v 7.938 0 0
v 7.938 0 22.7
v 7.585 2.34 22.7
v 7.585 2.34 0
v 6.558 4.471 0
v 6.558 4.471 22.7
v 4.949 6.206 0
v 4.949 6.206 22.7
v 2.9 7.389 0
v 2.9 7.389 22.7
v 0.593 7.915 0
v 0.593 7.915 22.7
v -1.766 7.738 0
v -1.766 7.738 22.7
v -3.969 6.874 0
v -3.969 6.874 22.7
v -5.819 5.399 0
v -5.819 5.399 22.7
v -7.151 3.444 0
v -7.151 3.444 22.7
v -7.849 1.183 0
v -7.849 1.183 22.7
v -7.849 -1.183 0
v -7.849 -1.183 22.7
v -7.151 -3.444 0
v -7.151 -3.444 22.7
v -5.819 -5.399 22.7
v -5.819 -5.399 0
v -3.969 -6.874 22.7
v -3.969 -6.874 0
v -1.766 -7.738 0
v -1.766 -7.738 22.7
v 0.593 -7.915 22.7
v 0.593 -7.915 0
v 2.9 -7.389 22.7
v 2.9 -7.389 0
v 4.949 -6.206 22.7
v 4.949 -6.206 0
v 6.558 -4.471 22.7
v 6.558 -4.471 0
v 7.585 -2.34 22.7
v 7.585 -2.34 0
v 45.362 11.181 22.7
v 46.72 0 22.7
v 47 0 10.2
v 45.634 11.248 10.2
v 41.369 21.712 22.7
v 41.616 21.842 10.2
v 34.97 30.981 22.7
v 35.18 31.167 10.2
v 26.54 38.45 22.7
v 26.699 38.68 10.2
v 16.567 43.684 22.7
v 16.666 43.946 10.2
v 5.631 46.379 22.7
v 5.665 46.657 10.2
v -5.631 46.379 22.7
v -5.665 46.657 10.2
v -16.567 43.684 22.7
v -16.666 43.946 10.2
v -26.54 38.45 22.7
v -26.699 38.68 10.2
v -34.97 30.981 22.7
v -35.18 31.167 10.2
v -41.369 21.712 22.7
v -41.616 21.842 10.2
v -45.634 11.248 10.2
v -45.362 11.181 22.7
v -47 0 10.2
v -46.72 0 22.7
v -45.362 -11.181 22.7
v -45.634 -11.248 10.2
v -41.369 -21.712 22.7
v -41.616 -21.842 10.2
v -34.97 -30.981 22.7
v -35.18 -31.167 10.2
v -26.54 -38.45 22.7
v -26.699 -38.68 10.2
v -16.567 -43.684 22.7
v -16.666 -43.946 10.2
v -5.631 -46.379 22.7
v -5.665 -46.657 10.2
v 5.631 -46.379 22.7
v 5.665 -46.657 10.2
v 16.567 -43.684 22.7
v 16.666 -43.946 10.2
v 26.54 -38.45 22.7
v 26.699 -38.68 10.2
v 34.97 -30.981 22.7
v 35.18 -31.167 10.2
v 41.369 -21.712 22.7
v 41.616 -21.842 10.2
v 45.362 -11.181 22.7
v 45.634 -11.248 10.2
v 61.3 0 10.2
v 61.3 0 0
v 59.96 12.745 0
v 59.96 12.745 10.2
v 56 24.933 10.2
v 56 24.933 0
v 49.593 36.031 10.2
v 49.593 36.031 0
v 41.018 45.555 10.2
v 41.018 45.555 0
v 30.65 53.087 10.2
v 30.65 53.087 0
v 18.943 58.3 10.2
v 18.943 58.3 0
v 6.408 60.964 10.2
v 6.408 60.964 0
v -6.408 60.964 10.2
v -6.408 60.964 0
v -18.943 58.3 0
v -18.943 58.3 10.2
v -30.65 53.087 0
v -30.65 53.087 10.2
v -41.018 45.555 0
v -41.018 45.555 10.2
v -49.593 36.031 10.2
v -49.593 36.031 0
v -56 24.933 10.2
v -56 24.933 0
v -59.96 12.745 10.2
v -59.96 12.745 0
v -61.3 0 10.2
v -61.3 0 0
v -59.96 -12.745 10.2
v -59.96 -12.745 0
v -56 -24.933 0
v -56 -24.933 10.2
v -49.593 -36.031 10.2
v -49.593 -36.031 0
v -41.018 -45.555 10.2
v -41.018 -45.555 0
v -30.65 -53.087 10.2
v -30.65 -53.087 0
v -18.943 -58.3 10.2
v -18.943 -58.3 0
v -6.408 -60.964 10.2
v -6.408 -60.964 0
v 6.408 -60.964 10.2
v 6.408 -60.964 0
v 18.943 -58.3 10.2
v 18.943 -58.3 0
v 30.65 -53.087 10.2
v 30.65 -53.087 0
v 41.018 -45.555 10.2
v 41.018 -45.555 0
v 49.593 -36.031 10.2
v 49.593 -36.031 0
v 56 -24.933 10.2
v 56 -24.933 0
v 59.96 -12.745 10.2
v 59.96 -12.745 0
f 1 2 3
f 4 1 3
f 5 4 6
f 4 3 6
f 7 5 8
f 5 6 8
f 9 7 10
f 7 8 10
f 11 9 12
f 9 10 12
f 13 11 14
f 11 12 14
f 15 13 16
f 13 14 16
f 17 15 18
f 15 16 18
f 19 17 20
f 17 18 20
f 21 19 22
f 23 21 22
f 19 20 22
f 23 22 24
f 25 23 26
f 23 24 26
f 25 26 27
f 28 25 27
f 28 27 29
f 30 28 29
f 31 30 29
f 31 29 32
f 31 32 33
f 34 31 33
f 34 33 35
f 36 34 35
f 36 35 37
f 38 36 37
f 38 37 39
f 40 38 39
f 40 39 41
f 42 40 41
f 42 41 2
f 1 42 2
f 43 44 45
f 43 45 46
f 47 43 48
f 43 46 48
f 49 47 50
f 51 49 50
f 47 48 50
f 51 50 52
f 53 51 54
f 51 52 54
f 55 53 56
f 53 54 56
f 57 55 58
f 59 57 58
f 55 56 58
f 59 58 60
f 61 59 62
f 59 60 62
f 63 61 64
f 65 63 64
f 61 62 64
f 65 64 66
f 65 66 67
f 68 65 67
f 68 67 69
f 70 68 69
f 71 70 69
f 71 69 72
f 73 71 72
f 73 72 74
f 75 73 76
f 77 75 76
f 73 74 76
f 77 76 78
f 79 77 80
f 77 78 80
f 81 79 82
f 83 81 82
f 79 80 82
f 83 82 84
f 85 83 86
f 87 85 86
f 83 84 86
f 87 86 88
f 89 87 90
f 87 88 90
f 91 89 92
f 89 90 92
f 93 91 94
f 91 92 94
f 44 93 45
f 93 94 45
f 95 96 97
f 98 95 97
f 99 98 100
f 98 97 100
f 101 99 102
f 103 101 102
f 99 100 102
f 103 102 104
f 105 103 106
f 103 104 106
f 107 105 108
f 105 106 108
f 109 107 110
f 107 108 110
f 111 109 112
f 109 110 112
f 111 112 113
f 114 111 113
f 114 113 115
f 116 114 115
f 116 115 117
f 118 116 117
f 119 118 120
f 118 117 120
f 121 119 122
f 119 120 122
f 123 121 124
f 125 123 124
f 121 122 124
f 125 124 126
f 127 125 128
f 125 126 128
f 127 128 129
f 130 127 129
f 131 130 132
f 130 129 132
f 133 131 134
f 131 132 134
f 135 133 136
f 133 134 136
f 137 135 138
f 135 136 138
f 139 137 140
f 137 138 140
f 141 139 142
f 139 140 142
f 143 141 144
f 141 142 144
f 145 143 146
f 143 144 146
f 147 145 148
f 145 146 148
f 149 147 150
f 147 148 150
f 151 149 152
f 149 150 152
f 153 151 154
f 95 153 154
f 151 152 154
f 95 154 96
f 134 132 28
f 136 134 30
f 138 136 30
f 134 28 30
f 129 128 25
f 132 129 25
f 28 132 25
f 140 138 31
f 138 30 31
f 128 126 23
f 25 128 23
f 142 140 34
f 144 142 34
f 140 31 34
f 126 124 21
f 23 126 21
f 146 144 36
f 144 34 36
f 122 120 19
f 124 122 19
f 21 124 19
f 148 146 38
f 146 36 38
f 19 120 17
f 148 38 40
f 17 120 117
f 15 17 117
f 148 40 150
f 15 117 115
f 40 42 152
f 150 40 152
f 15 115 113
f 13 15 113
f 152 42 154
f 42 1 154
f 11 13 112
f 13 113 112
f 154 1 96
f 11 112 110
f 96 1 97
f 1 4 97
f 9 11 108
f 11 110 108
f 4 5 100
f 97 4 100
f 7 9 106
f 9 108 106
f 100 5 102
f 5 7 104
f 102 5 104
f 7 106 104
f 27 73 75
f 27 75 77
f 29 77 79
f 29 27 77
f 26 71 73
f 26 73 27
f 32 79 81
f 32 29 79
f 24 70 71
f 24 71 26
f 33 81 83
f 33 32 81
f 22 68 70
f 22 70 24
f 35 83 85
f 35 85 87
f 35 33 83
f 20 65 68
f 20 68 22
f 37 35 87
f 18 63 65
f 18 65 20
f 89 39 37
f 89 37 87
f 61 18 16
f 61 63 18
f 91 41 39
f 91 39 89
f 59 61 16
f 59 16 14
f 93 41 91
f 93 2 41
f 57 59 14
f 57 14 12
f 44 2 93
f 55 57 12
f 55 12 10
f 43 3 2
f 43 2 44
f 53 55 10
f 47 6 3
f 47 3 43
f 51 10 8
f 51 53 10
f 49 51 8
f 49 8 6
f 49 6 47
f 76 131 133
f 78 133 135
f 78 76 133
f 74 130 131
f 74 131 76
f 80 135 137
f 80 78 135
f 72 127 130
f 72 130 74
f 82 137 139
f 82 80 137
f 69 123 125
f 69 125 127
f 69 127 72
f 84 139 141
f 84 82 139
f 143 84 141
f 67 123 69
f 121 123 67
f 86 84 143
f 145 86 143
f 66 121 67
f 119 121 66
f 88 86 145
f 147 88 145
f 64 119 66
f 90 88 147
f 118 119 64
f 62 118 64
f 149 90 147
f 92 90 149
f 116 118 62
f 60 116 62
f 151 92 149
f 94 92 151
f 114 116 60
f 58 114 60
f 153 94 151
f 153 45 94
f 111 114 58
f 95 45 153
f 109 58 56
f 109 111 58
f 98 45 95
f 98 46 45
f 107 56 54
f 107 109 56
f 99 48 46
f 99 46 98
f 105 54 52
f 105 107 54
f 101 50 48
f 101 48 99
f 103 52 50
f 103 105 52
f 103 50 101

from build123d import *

# Parameters (mm, degrees)
F0_R     = 61.3
F1_DEPTH = 10.2
F2_R     = 47
F3_DEPTH = 12.5
F4_SIZE2 = 12.49999
F4_SIZE  = 0.27999
F5_R     = 7.9375
F6_DEPTH = 22.701


# Not quite as in the source:
# - a fillet or chamfer is up to 0.001 mm smaller than in the source, because OpenCascade refuses the exact size


with BuildPart() as f1:
    # F0 (on Top) → F1 (new body)
    with BuildSketch(Plane.XY):
        Circle(F0_R)
    extrude(amount=F1_DEPTH)

    # F2 (on face) → F3 (join)
    with BuildSketch(Plane.XY.offset(10.2)):
        Circle(F2_R)
    extrude(amount=F3_DEPTH)

    # F4 (size 0.28 and 12.5 in the source; OpenCascade refuses exactly that, so slightly less here)
    f4_edges = [f1.edges().sort_by_distance(p)[0] for p in [
        (-47, 0, 22.7),
    ]]
    f4_side = f1.faces().sort_by_distance((0, 0, 22.7))[0]
    chamfer(f4_edges, length=F4_SIZE, length2=F4_SIZE2, reference=f4_side)

    # F5 (on face) → F6 (cut, through all)
    with BuildSketch(Plane.XY.offset(22.7)):
        Circle(F5_R)
    extrude(amount=-F6_DEPTH, mode=Mode.SUBTRACT)


solid = f1.part
